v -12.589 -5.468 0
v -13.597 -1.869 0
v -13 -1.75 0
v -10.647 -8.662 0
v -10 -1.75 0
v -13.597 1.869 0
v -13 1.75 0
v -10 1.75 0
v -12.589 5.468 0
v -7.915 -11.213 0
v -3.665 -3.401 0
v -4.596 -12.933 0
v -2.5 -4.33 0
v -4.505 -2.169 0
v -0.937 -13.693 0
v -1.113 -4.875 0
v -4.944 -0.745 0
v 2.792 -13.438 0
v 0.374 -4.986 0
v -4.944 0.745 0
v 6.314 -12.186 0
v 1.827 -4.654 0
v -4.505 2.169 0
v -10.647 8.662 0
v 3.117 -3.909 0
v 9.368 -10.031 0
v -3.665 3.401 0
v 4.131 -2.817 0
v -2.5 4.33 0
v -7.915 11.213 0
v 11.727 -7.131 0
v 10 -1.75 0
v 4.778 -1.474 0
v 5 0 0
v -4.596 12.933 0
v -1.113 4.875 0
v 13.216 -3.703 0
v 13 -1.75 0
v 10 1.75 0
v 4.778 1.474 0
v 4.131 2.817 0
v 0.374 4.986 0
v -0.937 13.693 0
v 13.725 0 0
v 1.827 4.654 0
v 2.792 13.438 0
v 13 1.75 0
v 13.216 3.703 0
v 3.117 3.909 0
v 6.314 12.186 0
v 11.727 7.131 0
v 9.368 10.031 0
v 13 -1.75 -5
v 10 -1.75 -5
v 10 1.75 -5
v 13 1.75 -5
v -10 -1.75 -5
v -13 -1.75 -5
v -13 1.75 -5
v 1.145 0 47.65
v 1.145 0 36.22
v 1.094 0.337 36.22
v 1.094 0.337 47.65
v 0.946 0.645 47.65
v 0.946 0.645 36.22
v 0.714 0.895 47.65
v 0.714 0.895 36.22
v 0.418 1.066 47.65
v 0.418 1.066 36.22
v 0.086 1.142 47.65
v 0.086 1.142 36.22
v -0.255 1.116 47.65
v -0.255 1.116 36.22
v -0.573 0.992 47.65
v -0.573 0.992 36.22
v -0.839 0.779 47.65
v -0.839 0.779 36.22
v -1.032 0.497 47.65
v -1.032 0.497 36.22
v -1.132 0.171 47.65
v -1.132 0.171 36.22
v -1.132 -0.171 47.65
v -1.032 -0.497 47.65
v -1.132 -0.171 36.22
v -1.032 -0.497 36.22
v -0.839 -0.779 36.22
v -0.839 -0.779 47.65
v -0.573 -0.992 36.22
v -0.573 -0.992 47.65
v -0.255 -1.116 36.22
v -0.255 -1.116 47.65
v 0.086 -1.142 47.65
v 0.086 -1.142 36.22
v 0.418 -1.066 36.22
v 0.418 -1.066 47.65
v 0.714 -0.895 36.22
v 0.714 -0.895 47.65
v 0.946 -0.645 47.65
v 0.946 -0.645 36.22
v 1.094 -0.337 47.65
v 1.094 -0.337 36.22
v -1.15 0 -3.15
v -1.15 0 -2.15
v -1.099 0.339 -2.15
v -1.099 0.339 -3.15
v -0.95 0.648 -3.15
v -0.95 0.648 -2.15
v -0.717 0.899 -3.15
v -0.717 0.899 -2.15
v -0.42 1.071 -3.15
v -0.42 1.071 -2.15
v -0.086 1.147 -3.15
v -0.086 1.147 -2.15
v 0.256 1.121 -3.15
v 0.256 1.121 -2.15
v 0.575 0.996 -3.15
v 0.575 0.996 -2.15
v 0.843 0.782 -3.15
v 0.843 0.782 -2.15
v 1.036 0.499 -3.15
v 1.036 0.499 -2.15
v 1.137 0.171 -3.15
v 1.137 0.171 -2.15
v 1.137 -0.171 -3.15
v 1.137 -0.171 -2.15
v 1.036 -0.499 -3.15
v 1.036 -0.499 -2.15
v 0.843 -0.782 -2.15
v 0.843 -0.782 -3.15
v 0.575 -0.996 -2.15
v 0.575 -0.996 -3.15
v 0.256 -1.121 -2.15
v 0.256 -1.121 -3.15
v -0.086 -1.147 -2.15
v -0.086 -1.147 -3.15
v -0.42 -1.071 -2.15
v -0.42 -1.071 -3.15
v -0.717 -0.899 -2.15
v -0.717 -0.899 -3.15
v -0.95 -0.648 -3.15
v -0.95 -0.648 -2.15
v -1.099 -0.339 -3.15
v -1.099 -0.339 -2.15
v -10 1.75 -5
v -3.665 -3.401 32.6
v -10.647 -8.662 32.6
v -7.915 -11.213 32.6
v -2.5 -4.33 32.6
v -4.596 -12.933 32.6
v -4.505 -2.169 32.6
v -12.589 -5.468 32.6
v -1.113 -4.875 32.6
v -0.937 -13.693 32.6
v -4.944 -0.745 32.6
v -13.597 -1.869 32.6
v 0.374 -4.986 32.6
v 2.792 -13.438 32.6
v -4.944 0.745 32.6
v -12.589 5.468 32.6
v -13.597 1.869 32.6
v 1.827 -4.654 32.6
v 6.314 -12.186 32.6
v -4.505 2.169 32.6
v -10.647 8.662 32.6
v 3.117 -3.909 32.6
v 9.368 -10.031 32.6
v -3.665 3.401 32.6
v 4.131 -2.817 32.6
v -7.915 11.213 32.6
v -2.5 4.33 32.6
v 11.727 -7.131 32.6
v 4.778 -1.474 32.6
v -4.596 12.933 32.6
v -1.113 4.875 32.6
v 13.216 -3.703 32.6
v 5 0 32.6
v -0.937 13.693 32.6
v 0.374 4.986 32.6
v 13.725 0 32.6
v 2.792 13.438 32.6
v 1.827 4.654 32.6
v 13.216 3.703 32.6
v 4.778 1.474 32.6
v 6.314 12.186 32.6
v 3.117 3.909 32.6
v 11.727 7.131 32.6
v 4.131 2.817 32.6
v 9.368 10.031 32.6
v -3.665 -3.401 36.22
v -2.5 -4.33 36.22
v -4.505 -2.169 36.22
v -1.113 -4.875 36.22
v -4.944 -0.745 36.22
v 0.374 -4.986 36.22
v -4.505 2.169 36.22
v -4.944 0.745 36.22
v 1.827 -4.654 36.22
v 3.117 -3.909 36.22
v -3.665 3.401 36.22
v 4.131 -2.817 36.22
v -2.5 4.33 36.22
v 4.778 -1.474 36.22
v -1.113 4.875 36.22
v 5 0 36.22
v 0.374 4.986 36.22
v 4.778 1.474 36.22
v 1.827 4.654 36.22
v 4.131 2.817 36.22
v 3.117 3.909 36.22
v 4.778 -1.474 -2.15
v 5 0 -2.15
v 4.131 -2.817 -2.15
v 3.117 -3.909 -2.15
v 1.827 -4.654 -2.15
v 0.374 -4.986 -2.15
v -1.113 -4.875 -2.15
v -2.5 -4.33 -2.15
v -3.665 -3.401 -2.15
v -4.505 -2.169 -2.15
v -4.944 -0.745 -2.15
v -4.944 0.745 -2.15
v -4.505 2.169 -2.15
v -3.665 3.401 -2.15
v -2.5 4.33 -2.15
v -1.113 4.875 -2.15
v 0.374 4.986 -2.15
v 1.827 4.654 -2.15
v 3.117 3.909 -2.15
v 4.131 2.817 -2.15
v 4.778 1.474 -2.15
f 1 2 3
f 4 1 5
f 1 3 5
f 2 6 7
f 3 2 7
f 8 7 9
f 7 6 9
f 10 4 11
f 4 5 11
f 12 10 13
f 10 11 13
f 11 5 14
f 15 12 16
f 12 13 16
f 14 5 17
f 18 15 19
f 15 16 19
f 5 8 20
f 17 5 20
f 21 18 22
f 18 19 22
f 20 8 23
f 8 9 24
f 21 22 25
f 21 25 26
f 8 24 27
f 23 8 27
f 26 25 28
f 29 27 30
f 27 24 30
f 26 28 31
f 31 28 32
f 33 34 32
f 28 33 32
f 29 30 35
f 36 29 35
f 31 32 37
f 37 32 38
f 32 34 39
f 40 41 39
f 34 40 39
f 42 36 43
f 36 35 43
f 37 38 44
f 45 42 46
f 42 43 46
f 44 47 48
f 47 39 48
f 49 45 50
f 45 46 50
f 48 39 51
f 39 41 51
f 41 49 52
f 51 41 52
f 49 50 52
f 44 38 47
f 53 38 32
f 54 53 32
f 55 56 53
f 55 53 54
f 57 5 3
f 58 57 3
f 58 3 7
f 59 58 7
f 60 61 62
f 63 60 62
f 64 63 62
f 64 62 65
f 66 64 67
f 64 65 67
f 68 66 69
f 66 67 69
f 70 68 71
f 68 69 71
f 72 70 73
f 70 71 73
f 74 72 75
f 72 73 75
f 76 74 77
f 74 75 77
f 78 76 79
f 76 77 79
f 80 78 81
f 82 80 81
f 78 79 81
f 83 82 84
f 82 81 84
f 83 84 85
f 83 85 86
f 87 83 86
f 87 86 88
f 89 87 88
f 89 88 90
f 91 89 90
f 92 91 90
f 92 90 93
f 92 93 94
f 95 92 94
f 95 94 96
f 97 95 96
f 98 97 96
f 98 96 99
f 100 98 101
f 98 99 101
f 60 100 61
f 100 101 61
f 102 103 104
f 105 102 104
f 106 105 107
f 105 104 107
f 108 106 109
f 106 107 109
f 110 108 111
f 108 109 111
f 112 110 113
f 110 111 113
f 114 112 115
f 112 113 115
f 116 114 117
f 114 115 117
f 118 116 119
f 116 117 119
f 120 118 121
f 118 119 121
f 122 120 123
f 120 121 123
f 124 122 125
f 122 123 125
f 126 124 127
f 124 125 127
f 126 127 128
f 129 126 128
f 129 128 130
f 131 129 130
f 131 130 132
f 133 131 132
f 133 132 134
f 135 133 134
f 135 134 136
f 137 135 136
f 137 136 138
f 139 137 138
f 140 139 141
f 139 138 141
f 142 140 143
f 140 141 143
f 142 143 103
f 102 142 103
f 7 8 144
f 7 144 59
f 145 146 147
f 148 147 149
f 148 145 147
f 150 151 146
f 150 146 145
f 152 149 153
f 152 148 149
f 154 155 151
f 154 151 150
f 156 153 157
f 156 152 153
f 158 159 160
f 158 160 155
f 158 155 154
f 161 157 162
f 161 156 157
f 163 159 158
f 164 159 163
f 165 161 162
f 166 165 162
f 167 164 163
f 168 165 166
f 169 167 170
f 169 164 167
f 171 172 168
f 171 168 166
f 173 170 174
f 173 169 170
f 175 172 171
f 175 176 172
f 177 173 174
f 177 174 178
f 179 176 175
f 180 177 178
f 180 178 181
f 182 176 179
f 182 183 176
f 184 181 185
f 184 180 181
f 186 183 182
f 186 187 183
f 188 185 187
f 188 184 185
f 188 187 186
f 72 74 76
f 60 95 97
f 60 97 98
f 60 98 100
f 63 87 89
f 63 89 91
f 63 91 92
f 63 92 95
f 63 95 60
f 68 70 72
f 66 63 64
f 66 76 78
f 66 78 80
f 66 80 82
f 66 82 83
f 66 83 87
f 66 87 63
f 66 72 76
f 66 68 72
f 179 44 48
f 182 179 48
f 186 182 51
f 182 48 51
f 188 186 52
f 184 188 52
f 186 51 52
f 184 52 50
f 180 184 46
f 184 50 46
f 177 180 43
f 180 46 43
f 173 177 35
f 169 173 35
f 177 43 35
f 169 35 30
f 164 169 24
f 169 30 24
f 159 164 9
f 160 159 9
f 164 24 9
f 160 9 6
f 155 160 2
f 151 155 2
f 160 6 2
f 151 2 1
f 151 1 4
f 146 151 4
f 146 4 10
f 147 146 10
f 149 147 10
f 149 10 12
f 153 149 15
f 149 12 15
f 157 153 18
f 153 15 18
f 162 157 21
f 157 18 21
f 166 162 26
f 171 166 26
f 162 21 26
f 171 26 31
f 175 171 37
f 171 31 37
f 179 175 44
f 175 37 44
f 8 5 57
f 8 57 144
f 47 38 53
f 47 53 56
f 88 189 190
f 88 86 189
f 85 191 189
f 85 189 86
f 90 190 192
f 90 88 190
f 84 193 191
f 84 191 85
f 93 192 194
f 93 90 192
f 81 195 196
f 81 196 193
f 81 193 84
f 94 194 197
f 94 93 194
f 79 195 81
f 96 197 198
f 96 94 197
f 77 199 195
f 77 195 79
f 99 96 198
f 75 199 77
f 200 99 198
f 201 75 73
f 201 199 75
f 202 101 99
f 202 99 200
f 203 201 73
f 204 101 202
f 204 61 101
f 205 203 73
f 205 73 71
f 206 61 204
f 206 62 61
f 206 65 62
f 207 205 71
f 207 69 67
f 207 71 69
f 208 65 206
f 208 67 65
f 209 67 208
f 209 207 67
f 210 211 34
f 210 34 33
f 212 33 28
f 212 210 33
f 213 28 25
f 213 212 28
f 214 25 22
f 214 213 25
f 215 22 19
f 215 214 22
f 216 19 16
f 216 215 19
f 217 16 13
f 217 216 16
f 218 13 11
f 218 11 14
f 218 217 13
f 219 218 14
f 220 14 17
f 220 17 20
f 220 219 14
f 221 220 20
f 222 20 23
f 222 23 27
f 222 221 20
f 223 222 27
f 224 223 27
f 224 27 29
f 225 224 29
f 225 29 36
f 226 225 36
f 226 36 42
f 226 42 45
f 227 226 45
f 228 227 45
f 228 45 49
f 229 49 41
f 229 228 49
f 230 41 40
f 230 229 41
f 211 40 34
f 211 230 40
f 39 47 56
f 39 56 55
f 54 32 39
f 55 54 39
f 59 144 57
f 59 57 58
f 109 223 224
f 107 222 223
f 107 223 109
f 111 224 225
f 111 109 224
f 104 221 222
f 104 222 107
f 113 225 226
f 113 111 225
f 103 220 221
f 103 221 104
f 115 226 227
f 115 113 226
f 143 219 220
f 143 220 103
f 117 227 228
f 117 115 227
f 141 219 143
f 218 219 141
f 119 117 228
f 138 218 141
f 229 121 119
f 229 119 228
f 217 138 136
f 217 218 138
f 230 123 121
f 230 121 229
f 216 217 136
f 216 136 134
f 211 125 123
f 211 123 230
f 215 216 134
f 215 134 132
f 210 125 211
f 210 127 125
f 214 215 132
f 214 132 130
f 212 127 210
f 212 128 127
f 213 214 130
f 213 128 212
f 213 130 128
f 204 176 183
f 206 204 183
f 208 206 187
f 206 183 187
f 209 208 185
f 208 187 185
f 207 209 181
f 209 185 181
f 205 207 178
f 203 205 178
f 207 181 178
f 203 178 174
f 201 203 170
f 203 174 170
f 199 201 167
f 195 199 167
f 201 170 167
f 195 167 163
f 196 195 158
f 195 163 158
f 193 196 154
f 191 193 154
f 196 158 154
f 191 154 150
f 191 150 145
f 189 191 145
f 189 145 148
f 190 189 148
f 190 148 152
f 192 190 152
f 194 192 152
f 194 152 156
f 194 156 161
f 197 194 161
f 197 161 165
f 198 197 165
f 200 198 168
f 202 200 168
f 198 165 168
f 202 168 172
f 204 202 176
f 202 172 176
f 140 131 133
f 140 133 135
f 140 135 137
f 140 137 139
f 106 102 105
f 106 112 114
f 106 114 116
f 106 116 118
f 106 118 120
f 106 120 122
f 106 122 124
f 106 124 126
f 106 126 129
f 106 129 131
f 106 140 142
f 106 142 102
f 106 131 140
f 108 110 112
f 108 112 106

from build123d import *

# Parameters (mm, degrees)
SKETCH1_R           = 13.725
BOSS_EXTRUDE1_DEPTH = 32.6
SKETCH2_R           = 5
BOSS_EXTRUDE2_DEPTH = 3.62
SKETCH3_R           = 1.145
BOSS_EXTRUDE3_DEPTH = 11.43
BOSS_EXTRUDE4_START = 2.15
SKETCH4_R           = 5
BOSS_EXTRUDE4_DEPTH = 2.15
SKETCH5_R           = 1.15
BOSS_EXTRUDE5_DEPTH = 1
SKETCH6_W           = 3
SKETCH6_H           = 3.5
BOSS_EXTRUDE6_DEPTH = 5


with BuildPart() as part:
    # Sketch1 → Boss-Extrude1 (new body)
    with BuildSketch(Plane.XY):
        Circle(SKETCH1_R)
    extrude(amount=BOSS_EXTRUDE1_DEPTH)

    # Sketch2 → Boss-Extrude2 (add)
    with BuildSketch(Plane.XY.offset(32.6)):
        Circle(SKETCH2_R)
    extrude(amount=BOSS_EXTRUDE2_DEPTH)

    # Sketch3 → Boss-Extrude3 (add)
    with BuildSketch(Plane.XY.offset(36.22)):
        Circle(SKETCH3_R)
    extrude(amount=BOSS_EXTRUDE3_DEPTH)

    # Sketch4 → Boss-Extrude4 (add)
    with BuildSketch(Plane(origin=(0, 0, 0), x_dir=(-1, 0, 0), z_dir=(0, 0, -1)).offset(BOSS_EXTRUDE4_START)):
        with Locations(Location((0, 0, 0), (0, 0, 180))):
            Circle(SKETCH4_R)
    extrude(amount=-BOSS_EXTRUDE4_DEPTH)

    # Sketch5 → Boss-Extrude5 (add)
    with BuildSketch(Plane(origin=(0, 0, -2.15), x_dir=(-1, 0, 0), z_dir=(0, 0, -1))):
        Circle(SKETCH5_R)
    extrude(amount=BOSS_EXTRUDE5_DEPTH)

    # Sketch6 → Boss-Extrude6 (add)
    with BuildSketch(Plane(origin=(0, 0, 0), x_dir=(-1, 0, 0), z_dir=(0, 0, -1))):
        with Locations((-11.5, 0)):
            Rectangle(SKETCH6_W, SKETCH6_H)
        with Locations((11.5, 0)):
            Rectangle(SKETCH6_W, SKETCH6_H)
    extrude(amount=BOSS_EXTRUDE6_DEPTH)


solid = part.part
